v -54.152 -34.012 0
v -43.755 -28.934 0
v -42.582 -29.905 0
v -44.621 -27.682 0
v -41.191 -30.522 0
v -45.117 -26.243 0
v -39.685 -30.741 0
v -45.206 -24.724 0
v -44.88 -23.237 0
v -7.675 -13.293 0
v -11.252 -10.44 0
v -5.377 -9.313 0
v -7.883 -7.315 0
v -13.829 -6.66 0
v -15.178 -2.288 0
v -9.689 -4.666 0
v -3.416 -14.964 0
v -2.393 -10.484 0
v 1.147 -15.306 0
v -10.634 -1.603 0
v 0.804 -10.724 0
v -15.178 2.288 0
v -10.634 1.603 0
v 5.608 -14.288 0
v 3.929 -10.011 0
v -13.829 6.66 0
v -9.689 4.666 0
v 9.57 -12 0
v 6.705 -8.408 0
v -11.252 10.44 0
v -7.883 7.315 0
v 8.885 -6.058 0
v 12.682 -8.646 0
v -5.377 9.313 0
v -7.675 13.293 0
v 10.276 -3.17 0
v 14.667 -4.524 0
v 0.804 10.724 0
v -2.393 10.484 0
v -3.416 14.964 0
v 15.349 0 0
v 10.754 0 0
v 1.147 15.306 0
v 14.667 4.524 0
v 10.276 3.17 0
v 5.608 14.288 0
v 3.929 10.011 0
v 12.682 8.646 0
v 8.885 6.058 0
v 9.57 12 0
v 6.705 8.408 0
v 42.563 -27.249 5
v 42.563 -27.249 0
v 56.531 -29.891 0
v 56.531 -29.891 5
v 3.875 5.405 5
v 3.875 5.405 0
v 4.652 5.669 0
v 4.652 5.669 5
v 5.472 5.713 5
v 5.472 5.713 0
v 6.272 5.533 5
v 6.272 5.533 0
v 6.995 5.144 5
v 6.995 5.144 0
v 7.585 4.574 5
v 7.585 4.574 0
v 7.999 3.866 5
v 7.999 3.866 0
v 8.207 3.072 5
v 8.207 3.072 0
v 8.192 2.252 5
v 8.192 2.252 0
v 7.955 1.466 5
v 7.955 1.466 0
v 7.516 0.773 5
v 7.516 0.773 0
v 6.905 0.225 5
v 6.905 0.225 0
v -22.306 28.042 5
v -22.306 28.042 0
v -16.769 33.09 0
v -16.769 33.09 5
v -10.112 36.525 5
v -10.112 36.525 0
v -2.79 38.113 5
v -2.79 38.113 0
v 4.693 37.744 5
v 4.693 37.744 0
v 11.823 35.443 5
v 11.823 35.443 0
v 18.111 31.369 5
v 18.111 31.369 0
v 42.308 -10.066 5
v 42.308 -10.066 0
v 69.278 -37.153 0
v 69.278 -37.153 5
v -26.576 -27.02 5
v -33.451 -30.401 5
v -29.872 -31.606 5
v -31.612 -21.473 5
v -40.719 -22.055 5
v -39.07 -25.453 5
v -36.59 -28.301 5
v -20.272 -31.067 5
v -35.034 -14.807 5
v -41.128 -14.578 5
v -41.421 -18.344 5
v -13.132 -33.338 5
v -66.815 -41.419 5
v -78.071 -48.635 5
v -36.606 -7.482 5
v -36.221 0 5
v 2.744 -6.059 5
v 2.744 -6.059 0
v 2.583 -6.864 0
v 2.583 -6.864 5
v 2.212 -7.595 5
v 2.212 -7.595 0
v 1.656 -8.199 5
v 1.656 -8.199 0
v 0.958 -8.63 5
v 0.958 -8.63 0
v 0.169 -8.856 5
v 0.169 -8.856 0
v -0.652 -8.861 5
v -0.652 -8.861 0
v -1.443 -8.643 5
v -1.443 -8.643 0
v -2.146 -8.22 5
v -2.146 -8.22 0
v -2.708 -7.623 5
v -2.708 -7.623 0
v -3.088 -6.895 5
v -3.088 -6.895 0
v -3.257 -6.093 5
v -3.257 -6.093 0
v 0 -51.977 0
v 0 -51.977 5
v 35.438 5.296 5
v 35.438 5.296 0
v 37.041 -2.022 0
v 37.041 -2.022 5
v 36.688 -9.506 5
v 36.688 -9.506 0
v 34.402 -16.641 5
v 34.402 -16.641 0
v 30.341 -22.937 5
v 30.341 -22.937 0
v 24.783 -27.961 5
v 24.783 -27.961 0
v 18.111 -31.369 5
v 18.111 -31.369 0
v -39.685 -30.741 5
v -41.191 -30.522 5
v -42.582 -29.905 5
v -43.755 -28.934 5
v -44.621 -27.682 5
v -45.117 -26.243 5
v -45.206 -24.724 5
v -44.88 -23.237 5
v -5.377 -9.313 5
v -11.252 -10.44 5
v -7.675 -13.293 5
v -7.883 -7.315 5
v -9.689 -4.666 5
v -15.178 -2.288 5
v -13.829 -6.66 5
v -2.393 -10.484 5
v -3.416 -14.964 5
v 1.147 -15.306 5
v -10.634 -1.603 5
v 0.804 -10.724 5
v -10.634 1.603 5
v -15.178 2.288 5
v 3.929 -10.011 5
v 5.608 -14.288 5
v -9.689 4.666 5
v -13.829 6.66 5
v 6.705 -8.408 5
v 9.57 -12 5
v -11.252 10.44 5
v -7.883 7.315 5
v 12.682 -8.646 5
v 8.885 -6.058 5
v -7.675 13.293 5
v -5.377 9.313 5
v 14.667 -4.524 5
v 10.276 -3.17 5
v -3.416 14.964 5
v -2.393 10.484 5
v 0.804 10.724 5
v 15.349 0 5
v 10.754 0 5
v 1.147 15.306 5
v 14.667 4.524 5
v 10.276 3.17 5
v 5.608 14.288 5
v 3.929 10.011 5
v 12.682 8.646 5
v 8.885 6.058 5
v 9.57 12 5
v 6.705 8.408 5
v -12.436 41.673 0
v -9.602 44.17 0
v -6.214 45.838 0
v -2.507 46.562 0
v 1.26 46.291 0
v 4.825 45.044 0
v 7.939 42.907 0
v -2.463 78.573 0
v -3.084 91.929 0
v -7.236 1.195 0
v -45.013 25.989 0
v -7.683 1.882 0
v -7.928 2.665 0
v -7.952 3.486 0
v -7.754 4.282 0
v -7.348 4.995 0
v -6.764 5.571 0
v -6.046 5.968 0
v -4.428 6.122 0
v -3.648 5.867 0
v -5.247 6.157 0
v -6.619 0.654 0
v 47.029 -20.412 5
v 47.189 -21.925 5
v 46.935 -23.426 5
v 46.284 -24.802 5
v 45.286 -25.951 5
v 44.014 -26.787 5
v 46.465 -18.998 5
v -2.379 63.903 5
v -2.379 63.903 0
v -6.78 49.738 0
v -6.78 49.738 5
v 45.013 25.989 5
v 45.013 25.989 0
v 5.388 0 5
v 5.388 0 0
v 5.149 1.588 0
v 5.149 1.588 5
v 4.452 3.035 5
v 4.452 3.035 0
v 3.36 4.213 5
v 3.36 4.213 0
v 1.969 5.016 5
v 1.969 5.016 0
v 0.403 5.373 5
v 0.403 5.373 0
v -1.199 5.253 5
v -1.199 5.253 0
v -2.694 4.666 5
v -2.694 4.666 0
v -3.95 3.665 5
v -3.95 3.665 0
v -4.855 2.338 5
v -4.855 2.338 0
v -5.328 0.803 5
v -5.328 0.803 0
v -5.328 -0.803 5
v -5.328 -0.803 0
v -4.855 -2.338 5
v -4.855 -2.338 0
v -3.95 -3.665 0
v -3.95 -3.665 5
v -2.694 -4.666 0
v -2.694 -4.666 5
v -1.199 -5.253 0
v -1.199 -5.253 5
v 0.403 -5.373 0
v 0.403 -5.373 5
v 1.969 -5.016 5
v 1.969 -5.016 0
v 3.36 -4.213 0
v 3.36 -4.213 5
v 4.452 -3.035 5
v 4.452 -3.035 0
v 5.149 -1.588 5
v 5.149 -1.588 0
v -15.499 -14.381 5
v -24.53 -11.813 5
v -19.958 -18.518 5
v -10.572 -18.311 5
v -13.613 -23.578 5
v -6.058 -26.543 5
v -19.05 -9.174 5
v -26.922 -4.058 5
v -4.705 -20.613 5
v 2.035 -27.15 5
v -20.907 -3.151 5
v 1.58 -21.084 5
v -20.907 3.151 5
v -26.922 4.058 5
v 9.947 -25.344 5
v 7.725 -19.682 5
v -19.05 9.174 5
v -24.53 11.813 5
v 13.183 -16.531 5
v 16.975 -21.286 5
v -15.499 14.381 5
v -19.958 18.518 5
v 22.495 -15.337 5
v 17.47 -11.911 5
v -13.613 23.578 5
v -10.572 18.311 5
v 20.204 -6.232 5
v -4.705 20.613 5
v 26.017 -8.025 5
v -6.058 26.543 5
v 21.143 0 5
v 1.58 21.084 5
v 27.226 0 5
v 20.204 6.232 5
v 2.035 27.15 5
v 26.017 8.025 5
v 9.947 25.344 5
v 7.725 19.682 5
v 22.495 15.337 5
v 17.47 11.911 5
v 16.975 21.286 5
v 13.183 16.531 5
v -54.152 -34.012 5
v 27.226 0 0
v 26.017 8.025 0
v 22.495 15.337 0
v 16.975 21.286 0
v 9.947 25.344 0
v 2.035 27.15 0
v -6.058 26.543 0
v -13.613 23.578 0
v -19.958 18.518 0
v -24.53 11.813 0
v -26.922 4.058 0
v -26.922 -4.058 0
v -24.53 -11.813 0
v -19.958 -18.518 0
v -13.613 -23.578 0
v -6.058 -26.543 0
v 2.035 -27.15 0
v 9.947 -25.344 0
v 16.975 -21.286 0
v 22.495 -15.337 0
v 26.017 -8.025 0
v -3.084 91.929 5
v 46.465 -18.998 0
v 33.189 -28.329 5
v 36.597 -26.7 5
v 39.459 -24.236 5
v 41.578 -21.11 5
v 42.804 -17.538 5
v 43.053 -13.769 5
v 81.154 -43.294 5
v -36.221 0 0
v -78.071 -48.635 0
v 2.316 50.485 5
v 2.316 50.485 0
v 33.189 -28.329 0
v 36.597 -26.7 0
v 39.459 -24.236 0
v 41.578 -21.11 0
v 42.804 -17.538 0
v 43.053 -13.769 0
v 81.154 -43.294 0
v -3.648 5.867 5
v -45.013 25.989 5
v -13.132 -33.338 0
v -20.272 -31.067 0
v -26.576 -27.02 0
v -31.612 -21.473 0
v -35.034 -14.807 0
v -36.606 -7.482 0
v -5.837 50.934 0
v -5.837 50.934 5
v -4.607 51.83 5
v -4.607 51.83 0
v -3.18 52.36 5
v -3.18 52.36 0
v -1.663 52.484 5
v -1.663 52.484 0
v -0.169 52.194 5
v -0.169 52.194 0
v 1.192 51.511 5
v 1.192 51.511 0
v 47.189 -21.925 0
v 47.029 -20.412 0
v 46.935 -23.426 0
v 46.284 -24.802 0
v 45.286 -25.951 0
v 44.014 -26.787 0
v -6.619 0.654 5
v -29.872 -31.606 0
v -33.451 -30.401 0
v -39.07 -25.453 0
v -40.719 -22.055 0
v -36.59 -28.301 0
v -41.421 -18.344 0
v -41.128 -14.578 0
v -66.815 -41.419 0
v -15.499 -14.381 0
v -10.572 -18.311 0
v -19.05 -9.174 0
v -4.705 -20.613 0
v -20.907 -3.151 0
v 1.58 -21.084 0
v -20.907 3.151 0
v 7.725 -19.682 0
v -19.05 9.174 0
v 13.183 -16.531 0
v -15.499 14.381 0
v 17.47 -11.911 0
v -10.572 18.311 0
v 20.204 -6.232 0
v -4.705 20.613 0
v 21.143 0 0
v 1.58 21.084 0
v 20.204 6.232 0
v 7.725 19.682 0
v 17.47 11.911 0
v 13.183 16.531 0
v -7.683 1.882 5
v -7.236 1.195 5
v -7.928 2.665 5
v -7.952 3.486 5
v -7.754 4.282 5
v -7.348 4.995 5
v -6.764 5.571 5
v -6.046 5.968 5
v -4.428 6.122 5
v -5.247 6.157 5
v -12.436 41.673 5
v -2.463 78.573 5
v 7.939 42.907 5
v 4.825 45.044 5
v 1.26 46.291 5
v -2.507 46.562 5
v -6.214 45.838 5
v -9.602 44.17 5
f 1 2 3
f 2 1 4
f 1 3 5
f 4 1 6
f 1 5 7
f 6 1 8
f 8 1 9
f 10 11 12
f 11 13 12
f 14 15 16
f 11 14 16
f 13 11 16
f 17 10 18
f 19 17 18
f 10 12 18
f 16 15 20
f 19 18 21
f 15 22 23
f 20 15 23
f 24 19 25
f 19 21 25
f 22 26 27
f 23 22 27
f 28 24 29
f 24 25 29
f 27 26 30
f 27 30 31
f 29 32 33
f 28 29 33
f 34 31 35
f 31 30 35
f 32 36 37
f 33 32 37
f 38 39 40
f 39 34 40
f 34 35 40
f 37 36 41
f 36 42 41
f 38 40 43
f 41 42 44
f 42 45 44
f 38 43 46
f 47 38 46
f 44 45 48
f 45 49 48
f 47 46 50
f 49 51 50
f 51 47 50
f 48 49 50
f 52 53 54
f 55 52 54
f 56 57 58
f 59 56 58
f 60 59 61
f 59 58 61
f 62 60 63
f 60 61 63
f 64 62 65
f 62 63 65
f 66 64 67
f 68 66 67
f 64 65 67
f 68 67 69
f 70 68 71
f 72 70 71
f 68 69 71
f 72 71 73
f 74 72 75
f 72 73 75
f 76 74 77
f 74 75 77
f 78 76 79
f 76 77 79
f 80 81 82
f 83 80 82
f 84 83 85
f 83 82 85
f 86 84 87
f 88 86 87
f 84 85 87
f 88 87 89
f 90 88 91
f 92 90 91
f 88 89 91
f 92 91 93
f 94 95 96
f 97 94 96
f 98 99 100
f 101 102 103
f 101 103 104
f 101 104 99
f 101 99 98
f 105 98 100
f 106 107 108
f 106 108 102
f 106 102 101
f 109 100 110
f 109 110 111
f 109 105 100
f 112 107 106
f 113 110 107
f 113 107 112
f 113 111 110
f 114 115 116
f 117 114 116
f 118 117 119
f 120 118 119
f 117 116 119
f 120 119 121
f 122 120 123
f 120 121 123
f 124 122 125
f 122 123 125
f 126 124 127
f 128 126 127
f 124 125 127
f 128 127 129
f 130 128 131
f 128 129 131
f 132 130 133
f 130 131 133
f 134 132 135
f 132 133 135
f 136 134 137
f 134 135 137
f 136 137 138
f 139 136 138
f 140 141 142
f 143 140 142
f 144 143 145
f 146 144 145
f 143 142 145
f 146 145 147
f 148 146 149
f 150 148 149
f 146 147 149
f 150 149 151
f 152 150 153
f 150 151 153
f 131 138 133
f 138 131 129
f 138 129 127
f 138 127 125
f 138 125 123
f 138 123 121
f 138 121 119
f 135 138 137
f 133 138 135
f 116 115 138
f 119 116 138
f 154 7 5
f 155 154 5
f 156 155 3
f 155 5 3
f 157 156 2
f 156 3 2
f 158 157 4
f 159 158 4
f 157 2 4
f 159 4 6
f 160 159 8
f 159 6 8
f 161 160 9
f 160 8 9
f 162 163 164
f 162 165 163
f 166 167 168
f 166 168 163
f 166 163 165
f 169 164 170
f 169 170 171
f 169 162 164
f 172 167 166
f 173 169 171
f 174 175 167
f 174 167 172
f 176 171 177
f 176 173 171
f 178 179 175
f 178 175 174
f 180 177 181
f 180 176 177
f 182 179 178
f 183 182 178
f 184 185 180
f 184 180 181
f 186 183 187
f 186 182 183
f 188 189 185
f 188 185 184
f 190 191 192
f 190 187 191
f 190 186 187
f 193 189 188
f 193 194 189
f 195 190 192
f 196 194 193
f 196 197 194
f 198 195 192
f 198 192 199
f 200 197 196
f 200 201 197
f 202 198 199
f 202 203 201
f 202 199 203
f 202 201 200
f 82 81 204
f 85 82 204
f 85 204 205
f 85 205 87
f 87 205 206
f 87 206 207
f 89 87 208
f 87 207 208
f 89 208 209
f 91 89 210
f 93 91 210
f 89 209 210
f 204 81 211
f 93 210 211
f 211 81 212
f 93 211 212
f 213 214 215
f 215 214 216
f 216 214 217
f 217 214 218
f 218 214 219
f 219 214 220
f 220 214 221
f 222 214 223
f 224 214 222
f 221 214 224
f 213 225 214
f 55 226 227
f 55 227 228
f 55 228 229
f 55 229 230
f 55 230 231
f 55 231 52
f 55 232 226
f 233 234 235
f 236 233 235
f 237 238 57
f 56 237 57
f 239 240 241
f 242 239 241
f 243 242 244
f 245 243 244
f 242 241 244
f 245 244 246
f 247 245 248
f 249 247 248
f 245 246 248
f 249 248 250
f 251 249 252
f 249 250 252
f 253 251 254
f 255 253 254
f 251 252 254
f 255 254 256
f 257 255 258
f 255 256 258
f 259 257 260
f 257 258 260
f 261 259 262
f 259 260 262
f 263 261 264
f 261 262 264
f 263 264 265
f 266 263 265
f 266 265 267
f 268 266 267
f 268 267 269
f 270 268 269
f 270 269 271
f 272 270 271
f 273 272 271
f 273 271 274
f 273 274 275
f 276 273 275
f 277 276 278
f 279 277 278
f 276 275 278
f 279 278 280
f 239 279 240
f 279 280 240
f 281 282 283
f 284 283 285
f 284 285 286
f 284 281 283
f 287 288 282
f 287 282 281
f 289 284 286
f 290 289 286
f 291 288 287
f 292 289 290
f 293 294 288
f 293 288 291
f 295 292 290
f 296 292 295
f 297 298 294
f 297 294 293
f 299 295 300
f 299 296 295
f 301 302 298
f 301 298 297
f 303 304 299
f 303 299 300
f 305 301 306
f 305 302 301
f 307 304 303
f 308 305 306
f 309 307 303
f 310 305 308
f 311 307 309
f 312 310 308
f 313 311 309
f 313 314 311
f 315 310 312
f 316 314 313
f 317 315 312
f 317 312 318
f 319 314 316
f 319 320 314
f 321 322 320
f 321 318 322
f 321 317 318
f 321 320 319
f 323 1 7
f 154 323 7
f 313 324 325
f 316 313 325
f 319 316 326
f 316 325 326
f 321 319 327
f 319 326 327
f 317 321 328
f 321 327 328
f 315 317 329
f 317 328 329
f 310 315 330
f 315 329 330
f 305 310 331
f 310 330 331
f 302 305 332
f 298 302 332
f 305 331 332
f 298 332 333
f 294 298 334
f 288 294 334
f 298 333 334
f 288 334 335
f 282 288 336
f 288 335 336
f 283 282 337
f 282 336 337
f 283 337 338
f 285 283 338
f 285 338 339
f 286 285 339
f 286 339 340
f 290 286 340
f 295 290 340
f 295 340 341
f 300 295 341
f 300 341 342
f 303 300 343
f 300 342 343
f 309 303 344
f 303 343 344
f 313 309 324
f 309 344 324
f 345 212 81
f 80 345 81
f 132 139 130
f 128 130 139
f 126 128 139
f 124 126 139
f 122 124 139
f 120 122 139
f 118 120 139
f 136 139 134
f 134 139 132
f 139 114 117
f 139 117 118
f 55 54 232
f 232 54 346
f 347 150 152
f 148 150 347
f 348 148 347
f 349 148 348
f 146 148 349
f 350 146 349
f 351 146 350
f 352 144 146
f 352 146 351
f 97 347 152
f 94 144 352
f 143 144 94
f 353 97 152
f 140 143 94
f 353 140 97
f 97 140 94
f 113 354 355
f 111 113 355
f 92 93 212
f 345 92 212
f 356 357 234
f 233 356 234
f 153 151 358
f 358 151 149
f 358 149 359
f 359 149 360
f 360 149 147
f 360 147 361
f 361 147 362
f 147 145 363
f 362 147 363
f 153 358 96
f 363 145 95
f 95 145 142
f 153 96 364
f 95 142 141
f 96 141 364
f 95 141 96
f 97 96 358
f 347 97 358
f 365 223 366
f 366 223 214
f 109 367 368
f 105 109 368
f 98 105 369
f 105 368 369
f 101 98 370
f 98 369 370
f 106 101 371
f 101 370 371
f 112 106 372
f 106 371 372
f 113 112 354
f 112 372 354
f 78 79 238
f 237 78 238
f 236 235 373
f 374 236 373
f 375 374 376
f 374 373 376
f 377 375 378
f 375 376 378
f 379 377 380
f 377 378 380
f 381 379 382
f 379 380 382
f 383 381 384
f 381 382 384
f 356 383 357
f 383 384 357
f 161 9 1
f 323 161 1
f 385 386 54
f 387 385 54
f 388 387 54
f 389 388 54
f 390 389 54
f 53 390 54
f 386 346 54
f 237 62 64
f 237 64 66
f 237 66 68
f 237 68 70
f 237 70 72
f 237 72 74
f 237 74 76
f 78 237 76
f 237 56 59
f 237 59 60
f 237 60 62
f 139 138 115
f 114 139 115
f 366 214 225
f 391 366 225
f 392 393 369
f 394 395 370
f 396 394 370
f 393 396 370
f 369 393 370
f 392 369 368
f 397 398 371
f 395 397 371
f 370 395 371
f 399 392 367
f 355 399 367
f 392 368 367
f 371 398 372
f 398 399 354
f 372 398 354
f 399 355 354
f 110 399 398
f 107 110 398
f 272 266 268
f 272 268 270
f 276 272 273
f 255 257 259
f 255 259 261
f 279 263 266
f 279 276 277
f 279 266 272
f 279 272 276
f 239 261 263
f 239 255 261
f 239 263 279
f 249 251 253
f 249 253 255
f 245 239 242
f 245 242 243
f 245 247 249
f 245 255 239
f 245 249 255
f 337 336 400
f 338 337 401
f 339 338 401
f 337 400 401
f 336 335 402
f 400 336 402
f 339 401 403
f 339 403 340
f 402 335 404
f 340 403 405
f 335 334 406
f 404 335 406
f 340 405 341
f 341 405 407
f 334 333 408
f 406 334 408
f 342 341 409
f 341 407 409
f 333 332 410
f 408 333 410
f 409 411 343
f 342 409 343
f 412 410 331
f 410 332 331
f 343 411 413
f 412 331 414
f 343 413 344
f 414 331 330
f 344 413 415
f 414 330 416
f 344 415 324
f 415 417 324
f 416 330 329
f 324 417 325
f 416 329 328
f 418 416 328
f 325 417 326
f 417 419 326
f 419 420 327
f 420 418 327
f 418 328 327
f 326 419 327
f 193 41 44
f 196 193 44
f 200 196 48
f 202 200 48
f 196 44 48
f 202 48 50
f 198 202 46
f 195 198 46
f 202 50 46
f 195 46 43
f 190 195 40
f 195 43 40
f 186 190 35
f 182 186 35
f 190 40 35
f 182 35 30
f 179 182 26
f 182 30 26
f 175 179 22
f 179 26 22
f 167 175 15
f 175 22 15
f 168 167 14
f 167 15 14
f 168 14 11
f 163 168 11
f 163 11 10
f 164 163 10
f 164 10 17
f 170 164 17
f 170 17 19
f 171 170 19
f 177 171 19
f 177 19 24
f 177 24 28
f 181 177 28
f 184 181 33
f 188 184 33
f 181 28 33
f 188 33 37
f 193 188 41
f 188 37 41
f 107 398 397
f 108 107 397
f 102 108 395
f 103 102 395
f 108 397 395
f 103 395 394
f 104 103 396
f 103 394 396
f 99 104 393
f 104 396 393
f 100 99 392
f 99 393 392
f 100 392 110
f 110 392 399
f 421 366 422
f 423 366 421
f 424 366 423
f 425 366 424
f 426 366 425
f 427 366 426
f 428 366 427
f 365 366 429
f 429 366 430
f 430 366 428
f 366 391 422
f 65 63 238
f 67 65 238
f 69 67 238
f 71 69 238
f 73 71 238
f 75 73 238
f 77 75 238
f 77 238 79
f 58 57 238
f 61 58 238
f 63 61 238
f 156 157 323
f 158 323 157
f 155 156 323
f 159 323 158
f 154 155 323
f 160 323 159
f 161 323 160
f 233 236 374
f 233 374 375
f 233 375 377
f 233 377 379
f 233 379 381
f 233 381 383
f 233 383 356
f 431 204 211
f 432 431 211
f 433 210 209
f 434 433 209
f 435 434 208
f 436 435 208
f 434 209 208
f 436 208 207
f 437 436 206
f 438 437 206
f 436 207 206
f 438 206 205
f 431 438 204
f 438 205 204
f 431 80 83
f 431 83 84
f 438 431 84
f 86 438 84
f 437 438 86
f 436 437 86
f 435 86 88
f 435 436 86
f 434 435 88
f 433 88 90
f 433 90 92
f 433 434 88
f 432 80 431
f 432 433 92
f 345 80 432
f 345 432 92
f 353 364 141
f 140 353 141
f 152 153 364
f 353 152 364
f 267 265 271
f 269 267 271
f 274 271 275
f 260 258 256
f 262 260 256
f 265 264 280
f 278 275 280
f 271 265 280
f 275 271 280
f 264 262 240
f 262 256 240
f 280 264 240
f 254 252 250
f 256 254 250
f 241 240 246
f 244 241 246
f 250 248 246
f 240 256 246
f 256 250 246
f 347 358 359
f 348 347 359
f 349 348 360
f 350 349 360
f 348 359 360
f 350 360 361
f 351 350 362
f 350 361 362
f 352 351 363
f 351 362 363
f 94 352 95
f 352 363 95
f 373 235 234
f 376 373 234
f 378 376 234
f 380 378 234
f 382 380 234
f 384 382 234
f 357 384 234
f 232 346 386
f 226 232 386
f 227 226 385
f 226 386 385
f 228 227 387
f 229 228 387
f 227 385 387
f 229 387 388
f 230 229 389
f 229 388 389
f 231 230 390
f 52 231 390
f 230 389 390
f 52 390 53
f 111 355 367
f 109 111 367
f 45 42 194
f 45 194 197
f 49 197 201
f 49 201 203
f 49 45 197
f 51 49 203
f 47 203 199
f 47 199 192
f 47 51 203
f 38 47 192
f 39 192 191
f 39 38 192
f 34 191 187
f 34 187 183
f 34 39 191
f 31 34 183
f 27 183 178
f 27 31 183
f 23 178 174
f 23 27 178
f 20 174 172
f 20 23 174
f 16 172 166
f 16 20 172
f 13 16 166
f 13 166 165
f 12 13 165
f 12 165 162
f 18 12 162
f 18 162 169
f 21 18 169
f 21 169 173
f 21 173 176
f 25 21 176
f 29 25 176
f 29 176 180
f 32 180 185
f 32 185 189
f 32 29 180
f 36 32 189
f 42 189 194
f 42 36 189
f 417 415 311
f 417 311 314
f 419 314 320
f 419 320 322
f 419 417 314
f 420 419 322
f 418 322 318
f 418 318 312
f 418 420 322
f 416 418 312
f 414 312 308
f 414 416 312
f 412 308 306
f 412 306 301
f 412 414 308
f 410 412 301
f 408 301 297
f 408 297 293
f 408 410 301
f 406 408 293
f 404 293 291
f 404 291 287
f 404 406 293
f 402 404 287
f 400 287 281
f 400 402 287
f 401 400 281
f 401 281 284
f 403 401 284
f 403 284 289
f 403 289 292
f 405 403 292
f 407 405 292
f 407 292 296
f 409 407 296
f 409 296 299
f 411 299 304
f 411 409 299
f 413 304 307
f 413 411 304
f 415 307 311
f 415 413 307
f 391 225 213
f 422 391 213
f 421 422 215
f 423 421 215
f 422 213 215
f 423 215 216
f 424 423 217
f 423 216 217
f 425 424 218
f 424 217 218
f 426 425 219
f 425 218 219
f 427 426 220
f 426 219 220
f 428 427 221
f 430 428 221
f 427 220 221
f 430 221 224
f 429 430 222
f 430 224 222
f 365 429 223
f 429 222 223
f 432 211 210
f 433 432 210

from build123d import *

# Parameters (mm, degrees)
F2_DEPTH = 5
F0_R     = 5.3883314641
F3_DEPTH = 5
F0_R_2   = 15.3491725301
F0_R_3   = 10.7539730603
F0_R_4   = 27.2260872448
F0_R_5   = 21.1434047245


with BuildPart() as f2:
    # F1 (on Top) → F2 (new body)
    with BuildSketch(Plane.XY):
        with BuildLine():
            ThreePointArc((-6.6190029433, 0.6535210892), (-7.5753216914, 4.6520384546), (-3.647696923, 5.867131187))
            Line((-3.647696923, 5.867131187), (-45.0134866516, 25.9885486355))
            Line((-45.0134866516, 25.9885486355), (-6.6190029433, 0.6535210892))
        make_face()
    extrude(amount=F2_DEPTH)


with BuildPart() as f2b:
    # F1 (on Top) → F2, piece 2 (new body)
    with BuildSketch(Plane.XY):
        with BuildLine():
            ThreePointArc((2.7435356065, -6.0589852412), (-0.2411226354, -8.8864402538), (-3.2572361938, -6.0925637942))
            Line((-3.2572361938, -6.0925637942), (0, -51.9770972709))
            Line((0, -51.9770972709), (2.7435356065, -6.0589852412))
        make_face()
    extrude(amount=F2_DEPTH)


with BuildPart() as f2c:
    # F1 (on Top) → F2, piece 3 (new body)
    with BuildSketch(Plane.XY):
        with BuildLine():
            ThreePointArc((3.8754673368, 5.405464152), (7.8164443267, 4.2344017993), (6.9049331168, 0.2254326071))
            Line((6.9049331168, 0.2254326071), (45.0134866516, 25.9885486355))
            Line((45.0134866516, 25.9885486355), (3.8754673368, 5.405464152))
        make_face()
    extrude(amount=F2_DEPTH)


with BuildPart() as f3:
    # F0 (on Top) → F3 (new body)
    with BuildSketch(Plane.XY):
        Circle(F0_R)
    extrude(amount=F3_DEPTH)


with BuildPart() as f3b:
    # F0 (on Top) → F3, piece 2 (new body)
    with BuildSketch(Plane.XY):
        Circle(F0_R_2)
        Circle(F0_R_3, mode=Mode.SUBTRACT)
    extrude(amount=F3_DEPTH)


with BuildPart() as f3c:
    # F0 (on Top) → F3, piece 3 (new body)
    with BuildSketch(Plane.XY):
        Circle(F0_R_4)
        Circle(F0_R_5, mode=Mode.SUBTRACT)
    extrude(amount=F3_DEPTH)


with BuildPart() as f3d:
    # F0 (on Top) → F3, piece 4 (new body)
    with BuildSketch(Plane.XY):
        with BuildLine():
            ThreePointArc((-13.1320310757, -33.3381593227), (-31.6122736468, -21.472525362), (-36.2213179469, 0))
            Line((-36.2213179469, 0), (-78.0706480145, -48.6348122358))
            Line((-78.0706480145, -48.6348122358), (-13.1320310757, -33.3381593227))
        make_face()
        with BuildLine():
            Line((-66.8146163225, -41.4194054902), (-41.1277897656, -14.5781142637))
            ThreePointArc((-41.1277897656, -14.5781142637), (-39.0703952793, -25.4525283991), (-29.8717617989, -31.6064618528))
            Line((-29.8717617989, -31.6064618528), (-66.8146163225, -41.4194054902))
        make_face(mode=Mode.SUBTRACT)
    extrude(amount=F3_DEPTH)


with BuildPart() as f3e:
    # F0 (on Top) → F3, piece 5 (new body)
    with BuildSketch(Plane.XY):
        with BuildLine():
            ThreePointArc((-39.6847091615, -30.7406131178), (-44.2311292925, -28.337826886), (-44.8797978461, -23.2365969568))
            Line((-44.8797978461, -23.2365969568), (-54.1516726204, -34.0118205505))
            Line((-54.1516726204, -34.0118205505), (-39.6847091615, -30.7406131178))
        make_face()
    extrude(amount=F3_DEPTH)


with BuildPart() as f3f:
    # F0 (on Top) → F3, piece 6 (new body)
    with BuildSketch(Plane.XY):
        with BuildLine():
            ThreePointArc((-22.3056773511, 28.0417521762), (-2.7896156235, 38.1132947305), (18.1106589735, 31.3685815006))
            Line((18.1106589735, 31.3685815006), (-3.0836588972, 91.9285705884))
            Line((-3.0836588972, 91.9285705884), (-22.3056773511, 28.0417521762))
        make_face()
        with BuildLine():
            Line((-2.4629492029, 78.5728578245), (7.9388775912, 42.9067678704))
            ThreePointArc((7.9388775912, 42.9067678704), (-2.5073385445, 46.5622190473), (-12.4361179888, 41.6729355))
            Line((-12.4361179888, 41.6729355), (-2.4629492029, 78.5728578245))
        make_face(mode=Mode.SUBTRACT)
    extrude(amount=F3_DEPTH)


with BuildPart() as f3g:
    # F0 (on Top) → F3, piece 7 (new body)
    with BuildSketch(Plane.XY):
        with BuildLine():
            ThreePointArc((-6.7797973072, 49.7382728346), (-2.4257133251, 52.4741950484), (2.3164156609, 50.4853435298))
            Line((2.3164156609, 50.4853435298), (-2.3792643155, 63.902634422))
            Line((-2.3792643155, 63.902634422), (-6.7797973072, 49.7382728346))
        make_face()
    extrude(amount=F3_DEPTH)


with BuildPart() as f3h:
    # F0 (on Top) → F3, piece 8 (new body)
    with BuildSketch(Plane.XY):
        with BuildLine():
            ThreePointArc((35.4377084267, 5.2964071466), (34.4018892703, -16.6407693686), (18.1106589735, -31.3685815006))
            Line((18.1106589735, -31.3685815006), (81.1543069118, -43.2937583526))
            Line((81.1543069118, -43.2937583526), (35.4377084267, 5.2964071466))
        make_face()
        with BuildLine():
            Line((69.2775655254, -37.1534523343), (33.1889121744, -28.3286536067))
            ThreePointArc((33.1889121744, -28.3286536067), (41.5777338238, -21.1096906482), (42.3078797877, -10.0664736472))
            Line((42.3078797877, -10.0664736472), (69.2775655254, -37.1534523343))
        make_face(mode=Mode.SUBTRACT)
    extrude(amount=F3_DEPTH)


with BuildPart() as f3i:
    # F0 (on Top) → F3, piece 9 (new body)
    with BuildSketch(Plane.XY):
        with BuildLine():
            ThreePointArc((46.4645064687, -18.9976597168), (46.6568426176, -24.1363681623), (42.5633821852, -27.248746573))
            Line((42.5633821852, -27.248746573), (56.5309369359, -29.8908138714))
            Line((56.5309369359, -29.8908138714), (46.4645064687, -18.9976597168))
        make_face()
    extrude(amount=F3_DEPTH)


solid = Compound([f2.part, f2b.part, f2c.part, f3.part, f3b.part, f3c.part, f3d.part, f3e.part, f3f.part, f3g.part, f3h.part, f3i.part])
